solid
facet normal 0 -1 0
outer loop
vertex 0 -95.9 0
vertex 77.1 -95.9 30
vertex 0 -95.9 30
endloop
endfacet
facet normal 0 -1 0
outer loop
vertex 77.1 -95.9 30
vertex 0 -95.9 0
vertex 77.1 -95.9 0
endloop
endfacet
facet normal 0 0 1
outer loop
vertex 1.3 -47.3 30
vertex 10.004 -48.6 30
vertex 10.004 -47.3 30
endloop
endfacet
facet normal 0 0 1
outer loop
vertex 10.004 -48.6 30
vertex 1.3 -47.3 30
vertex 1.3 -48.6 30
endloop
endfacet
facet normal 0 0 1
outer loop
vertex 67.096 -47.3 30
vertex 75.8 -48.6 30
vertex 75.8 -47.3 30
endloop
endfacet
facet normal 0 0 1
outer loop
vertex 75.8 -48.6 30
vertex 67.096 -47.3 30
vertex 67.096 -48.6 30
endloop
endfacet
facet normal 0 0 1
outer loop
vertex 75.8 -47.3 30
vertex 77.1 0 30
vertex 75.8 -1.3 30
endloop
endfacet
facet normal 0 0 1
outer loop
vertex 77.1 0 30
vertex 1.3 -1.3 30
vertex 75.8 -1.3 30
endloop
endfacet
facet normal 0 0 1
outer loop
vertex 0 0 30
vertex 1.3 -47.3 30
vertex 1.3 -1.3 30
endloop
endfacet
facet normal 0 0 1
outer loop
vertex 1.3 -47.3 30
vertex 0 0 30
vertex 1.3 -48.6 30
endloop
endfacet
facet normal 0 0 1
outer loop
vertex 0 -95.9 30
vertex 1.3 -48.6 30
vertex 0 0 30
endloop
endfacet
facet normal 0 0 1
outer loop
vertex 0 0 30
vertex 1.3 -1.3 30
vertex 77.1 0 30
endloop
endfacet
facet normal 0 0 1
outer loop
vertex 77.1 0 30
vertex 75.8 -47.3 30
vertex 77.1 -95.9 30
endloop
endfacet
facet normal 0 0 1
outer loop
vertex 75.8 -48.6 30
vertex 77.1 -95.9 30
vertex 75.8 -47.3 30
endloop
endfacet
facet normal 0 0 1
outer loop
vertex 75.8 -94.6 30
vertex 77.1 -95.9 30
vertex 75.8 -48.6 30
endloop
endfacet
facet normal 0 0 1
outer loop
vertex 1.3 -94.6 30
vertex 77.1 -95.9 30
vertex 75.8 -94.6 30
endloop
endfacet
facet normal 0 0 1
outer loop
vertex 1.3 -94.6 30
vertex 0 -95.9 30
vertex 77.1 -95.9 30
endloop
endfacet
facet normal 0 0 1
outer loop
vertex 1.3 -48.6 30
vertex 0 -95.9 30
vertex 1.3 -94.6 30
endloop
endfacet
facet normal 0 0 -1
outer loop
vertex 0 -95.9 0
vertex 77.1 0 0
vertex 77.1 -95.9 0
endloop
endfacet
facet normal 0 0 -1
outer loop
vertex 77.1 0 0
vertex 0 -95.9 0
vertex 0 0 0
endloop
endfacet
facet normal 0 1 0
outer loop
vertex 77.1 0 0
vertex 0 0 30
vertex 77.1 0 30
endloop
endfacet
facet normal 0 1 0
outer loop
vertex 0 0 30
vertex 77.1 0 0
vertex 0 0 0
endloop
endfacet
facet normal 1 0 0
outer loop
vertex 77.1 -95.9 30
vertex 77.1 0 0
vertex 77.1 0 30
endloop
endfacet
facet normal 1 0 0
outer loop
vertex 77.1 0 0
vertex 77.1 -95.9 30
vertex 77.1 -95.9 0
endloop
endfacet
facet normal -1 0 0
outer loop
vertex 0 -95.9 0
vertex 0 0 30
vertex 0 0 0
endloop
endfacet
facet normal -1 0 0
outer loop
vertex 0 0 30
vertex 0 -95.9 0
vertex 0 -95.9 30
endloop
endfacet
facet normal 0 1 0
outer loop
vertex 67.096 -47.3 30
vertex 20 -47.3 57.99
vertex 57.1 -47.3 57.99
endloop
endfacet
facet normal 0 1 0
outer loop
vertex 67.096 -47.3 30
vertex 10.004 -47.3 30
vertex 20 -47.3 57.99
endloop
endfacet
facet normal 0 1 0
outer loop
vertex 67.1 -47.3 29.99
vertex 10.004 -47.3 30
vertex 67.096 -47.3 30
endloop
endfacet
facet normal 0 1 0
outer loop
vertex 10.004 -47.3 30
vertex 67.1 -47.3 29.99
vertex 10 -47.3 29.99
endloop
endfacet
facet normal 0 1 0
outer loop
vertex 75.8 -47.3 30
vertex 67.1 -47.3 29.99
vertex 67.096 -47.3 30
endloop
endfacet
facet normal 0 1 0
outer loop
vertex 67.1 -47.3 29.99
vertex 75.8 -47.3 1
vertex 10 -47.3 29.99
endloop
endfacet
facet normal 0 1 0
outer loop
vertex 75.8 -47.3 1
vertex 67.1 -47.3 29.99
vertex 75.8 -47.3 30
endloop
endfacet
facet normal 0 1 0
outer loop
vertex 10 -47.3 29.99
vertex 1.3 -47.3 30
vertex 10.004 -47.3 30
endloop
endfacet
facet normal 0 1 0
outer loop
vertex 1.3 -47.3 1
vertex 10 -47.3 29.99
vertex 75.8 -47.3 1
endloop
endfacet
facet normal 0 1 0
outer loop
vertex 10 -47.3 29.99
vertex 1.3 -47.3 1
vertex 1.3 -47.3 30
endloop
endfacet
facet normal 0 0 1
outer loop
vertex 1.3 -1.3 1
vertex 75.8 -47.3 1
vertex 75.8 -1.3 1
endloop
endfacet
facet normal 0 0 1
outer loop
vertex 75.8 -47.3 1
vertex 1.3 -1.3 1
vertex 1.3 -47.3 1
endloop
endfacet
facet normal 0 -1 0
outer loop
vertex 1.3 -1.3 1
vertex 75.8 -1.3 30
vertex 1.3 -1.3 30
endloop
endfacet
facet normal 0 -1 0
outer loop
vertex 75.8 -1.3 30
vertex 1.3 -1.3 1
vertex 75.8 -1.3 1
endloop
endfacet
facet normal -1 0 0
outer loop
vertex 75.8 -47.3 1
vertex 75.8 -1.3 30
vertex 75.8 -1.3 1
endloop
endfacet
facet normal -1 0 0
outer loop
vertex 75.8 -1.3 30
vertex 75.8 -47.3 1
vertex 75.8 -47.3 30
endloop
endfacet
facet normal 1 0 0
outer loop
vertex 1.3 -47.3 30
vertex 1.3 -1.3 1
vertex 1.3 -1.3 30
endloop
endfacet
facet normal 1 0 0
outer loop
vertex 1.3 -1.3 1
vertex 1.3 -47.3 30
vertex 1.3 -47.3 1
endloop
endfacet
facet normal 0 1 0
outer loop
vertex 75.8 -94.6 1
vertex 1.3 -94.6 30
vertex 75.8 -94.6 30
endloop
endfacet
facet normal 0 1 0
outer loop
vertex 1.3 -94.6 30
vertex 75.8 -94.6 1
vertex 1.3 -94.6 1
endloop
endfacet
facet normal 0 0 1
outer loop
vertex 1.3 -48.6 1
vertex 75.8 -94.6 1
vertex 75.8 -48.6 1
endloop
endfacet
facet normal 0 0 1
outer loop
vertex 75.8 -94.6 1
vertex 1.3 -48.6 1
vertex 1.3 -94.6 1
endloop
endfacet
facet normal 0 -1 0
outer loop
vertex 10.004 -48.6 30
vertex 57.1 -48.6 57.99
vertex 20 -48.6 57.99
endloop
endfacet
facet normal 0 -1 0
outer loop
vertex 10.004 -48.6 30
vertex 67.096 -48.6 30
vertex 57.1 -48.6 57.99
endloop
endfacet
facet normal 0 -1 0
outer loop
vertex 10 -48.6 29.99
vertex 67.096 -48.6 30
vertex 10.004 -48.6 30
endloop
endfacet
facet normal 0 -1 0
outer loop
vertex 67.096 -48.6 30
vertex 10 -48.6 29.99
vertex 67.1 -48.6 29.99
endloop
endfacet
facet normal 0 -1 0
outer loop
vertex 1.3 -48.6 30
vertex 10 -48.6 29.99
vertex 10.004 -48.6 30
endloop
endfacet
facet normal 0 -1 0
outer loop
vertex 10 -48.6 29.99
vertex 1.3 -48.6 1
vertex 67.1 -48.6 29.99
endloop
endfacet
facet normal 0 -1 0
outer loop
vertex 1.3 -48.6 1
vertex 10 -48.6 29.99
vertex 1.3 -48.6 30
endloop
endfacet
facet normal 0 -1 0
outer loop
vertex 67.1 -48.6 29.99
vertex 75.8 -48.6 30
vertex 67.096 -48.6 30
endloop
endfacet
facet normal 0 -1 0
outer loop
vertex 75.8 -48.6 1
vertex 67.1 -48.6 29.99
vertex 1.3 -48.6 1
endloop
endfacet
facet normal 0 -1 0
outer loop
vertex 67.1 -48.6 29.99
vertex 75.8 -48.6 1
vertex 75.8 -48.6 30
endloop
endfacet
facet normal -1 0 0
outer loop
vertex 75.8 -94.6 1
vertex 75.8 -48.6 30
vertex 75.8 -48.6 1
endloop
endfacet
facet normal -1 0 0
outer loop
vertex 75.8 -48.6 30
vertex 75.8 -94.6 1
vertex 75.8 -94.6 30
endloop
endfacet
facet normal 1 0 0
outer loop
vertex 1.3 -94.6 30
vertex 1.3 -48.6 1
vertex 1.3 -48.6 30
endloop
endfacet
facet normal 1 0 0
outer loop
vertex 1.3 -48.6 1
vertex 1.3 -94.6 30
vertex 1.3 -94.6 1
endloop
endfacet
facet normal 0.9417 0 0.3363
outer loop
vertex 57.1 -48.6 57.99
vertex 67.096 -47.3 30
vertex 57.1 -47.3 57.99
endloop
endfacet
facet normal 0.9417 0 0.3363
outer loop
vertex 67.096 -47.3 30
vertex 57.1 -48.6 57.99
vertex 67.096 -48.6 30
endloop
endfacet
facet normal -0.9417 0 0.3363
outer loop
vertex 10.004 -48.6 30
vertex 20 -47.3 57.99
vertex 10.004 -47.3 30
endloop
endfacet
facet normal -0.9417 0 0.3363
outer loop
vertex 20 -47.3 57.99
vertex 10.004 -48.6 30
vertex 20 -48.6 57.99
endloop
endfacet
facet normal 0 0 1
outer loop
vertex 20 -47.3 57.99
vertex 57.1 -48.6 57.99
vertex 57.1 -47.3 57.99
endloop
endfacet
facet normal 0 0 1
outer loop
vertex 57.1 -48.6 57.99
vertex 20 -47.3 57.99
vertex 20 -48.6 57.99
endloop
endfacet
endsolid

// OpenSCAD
floor_thickness = 1;
wall_thickness = 1.3;
wall_height = 30; // [25:40]
tab_height = 28;

inside_length = 74.5;

/* [Hidden] */
length = inside_length + wall_thickness * 2;
width = 46 * 2 + wall_thickness * 3;
fudge = 0.1;

rotate(a=[0,0,-90]) {
union () {
difference () {
	cube([width,length,wall_height]);
	translate ([wall_thickness,wall_thickness,floor_thickness]) {
		cube([46,inside_length,wall_height]);
	}
	translate ([46 + wall_thickness*2,wall_thickness,floor_thickness]) {
		cube([46,inside_length,wall_height]);
	}
};
translate([46+wall_thickness,0,wall_height-.01])
rotate(a=[90,0,90])
linear_extrude(height = wall_thickness)
	polygon(points=[[10,0],[20,tab_height],[length - 20,tab_height],[length-10,0]]);
};

};
